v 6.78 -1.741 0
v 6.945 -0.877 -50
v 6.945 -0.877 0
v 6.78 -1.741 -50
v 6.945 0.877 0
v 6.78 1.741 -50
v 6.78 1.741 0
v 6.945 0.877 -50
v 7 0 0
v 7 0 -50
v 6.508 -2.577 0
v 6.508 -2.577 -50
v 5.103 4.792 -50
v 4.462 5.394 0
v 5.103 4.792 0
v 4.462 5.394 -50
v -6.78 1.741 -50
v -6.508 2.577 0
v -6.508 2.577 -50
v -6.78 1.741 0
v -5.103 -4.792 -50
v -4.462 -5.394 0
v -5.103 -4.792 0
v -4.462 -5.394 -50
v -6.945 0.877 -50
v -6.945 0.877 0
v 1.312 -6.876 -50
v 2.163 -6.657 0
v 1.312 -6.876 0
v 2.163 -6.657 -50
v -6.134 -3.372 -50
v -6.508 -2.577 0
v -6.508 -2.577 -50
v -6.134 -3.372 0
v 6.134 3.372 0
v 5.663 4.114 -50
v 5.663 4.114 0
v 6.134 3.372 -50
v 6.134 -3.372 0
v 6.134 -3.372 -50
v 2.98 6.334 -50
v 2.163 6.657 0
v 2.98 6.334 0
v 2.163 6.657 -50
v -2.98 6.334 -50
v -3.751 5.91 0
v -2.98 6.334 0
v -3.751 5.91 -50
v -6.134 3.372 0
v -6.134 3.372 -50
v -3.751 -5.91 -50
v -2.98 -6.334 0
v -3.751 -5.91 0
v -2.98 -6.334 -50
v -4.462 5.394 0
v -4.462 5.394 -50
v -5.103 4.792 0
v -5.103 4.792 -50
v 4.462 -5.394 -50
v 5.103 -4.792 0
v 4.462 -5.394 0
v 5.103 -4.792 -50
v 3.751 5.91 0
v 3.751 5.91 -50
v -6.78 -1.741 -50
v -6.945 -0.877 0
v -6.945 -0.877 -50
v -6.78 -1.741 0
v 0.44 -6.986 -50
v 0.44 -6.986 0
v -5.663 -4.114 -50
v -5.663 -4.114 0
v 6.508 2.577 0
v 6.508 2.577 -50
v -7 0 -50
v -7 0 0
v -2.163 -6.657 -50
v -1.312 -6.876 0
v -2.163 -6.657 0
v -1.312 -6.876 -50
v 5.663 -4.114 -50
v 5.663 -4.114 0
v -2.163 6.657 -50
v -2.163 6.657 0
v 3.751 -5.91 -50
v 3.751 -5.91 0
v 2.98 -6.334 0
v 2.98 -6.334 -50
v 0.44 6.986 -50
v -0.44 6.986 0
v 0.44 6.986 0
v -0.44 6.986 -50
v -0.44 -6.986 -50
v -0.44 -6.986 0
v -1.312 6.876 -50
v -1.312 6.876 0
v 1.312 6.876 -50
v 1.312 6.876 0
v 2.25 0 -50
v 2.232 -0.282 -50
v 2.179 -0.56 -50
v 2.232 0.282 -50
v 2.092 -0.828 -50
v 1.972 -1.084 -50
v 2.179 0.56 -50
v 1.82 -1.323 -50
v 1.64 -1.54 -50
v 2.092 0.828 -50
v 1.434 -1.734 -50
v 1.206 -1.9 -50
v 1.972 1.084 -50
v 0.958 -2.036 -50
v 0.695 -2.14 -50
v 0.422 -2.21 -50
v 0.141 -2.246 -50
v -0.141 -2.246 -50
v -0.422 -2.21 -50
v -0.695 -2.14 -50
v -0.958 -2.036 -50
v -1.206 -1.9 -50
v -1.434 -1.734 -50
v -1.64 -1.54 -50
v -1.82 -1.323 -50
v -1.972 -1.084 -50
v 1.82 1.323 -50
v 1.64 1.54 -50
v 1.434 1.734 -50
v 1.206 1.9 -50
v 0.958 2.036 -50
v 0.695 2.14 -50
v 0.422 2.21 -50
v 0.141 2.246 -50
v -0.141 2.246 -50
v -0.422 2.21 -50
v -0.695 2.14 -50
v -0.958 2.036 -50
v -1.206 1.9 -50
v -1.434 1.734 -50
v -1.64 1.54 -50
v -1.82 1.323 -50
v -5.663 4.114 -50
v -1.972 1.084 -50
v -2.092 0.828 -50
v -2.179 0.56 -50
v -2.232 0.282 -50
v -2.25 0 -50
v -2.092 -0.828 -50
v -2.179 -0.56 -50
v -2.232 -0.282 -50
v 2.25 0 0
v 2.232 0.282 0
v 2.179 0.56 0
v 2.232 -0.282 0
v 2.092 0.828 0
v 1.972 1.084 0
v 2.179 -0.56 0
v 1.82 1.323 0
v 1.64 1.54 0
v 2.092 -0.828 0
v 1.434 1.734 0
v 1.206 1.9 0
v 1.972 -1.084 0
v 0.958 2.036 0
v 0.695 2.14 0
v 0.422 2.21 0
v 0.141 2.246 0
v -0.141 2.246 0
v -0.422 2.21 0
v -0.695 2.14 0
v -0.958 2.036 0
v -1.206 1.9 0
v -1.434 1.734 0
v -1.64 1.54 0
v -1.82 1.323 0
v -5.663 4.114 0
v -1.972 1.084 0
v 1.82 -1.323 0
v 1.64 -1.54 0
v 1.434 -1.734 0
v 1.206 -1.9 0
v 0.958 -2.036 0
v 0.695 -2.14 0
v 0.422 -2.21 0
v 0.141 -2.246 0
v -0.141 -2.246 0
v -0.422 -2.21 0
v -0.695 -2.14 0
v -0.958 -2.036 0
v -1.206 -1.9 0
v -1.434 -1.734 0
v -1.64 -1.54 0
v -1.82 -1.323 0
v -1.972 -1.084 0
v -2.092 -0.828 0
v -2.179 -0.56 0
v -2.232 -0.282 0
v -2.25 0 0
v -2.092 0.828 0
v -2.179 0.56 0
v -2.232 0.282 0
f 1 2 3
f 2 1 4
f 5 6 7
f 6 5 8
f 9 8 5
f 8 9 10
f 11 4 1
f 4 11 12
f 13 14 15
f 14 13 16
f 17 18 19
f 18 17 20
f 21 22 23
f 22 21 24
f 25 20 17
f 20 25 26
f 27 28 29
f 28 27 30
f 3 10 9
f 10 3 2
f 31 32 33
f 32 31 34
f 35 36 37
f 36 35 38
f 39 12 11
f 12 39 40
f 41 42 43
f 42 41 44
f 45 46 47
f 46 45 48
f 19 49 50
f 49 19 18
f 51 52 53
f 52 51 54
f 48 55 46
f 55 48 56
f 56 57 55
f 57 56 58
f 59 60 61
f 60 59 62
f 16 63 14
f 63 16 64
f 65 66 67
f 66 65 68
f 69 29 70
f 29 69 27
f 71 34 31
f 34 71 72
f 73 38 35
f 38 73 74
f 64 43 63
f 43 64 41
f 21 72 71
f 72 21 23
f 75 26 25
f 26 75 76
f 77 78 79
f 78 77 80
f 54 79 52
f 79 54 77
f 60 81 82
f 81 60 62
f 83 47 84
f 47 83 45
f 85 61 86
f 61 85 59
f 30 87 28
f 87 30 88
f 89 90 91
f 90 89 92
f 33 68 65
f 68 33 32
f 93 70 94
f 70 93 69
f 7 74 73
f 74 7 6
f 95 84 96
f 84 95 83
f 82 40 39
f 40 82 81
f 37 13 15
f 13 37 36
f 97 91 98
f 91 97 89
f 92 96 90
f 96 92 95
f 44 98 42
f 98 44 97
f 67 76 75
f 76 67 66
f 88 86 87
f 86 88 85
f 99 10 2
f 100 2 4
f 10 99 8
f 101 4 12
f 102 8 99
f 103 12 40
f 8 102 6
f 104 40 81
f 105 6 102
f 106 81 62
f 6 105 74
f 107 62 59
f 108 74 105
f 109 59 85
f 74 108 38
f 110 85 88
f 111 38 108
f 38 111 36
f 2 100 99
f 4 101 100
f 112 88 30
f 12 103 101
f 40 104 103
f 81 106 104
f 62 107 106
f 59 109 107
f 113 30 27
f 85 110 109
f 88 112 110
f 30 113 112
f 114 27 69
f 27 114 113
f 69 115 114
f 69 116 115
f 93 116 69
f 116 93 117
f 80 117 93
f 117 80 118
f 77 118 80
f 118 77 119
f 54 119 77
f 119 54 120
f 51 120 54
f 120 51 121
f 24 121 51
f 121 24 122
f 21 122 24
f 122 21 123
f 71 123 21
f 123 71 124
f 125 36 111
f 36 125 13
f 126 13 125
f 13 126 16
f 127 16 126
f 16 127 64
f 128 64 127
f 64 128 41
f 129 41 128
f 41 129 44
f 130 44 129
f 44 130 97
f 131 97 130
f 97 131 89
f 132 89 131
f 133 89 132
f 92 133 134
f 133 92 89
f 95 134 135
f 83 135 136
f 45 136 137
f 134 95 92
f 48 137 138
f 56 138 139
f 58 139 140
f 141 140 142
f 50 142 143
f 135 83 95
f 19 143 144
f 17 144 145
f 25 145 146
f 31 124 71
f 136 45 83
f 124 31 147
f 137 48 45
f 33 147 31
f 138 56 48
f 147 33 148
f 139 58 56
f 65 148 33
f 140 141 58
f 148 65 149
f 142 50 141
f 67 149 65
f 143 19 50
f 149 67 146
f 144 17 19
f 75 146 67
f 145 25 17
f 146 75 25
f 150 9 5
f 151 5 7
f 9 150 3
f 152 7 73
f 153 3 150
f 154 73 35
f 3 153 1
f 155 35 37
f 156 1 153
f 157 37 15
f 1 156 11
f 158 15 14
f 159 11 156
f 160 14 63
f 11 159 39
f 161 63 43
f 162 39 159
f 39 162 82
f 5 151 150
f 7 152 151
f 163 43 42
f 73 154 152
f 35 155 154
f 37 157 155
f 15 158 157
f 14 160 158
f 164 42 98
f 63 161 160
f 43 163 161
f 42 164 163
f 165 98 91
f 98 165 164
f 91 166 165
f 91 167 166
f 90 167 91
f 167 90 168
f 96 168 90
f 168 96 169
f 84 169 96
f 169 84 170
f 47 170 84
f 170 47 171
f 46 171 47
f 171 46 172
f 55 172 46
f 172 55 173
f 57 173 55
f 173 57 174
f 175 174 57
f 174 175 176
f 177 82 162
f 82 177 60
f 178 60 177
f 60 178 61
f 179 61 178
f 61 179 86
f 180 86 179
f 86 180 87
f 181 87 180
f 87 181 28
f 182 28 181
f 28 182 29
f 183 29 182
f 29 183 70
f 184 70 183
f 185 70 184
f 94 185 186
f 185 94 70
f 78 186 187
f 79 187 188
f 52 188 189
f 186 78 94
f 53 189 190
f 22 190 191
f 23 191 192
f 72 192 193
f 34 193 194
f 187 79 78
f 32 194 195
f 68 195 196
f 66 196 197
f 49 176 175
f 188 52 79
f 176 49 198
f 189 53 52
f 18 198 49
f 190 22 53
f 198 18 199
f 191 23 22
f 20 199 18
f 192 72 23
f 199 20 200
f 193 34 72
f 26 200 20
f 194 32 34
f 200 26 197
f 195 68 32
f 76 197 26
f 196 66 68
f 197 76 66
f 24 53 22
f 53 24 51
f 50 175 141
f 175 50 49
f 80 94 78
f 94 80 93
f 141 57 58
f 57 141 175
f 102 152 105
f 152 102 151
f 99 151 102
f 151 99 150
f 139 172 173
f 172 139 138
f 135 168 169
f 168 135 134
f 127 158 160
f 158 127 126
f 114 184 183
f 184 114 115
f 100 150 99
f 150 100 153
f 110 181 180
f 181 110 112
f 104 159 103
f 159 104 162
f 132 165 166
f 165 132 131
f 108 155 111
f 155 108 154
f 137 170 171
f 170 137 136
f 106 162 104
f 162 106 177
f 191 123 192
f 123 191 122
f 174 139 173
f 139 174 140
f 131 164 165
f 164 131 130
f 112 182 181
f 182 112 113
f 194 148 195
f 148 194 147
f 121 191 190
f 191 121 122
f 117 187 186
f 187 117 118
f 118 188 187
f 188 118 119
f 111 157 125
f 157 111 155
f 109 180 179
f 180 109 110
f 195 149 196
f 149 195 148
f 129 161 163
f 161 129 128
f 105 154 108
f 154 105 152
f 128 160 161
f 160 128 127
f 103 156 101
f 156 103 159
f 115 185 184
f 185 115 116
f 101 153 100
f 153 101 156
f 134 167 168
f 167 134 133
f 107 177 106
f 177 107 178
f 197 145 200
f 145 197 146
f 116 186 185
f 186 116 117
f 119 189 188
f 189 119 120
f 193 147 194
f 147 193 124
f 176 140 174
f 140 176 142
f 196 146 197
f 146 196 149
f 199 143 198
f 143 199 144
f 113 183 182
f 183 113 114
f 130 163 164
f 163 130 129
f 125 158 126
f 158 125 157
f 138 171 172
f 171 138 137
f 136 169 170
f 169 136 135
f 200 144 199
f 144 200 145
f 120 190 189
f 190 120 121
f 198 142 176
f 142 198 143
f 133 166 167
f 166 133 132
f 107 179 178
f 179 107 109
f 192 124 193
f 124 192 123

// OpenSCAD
$fn = 50;


difference() {
	union() {
		translate(v = [0, 0, -50.0000000000]) {
			cylinder(h = 50, r = 7.0000000000);
		}
		cylinder(h = 0, r = 10.0000000000);
	}
	union() {
		#translate(v = [0, 0, -50]) {
			cylinder(h = 50, r = 2.2500000000);
		}
	}
}
